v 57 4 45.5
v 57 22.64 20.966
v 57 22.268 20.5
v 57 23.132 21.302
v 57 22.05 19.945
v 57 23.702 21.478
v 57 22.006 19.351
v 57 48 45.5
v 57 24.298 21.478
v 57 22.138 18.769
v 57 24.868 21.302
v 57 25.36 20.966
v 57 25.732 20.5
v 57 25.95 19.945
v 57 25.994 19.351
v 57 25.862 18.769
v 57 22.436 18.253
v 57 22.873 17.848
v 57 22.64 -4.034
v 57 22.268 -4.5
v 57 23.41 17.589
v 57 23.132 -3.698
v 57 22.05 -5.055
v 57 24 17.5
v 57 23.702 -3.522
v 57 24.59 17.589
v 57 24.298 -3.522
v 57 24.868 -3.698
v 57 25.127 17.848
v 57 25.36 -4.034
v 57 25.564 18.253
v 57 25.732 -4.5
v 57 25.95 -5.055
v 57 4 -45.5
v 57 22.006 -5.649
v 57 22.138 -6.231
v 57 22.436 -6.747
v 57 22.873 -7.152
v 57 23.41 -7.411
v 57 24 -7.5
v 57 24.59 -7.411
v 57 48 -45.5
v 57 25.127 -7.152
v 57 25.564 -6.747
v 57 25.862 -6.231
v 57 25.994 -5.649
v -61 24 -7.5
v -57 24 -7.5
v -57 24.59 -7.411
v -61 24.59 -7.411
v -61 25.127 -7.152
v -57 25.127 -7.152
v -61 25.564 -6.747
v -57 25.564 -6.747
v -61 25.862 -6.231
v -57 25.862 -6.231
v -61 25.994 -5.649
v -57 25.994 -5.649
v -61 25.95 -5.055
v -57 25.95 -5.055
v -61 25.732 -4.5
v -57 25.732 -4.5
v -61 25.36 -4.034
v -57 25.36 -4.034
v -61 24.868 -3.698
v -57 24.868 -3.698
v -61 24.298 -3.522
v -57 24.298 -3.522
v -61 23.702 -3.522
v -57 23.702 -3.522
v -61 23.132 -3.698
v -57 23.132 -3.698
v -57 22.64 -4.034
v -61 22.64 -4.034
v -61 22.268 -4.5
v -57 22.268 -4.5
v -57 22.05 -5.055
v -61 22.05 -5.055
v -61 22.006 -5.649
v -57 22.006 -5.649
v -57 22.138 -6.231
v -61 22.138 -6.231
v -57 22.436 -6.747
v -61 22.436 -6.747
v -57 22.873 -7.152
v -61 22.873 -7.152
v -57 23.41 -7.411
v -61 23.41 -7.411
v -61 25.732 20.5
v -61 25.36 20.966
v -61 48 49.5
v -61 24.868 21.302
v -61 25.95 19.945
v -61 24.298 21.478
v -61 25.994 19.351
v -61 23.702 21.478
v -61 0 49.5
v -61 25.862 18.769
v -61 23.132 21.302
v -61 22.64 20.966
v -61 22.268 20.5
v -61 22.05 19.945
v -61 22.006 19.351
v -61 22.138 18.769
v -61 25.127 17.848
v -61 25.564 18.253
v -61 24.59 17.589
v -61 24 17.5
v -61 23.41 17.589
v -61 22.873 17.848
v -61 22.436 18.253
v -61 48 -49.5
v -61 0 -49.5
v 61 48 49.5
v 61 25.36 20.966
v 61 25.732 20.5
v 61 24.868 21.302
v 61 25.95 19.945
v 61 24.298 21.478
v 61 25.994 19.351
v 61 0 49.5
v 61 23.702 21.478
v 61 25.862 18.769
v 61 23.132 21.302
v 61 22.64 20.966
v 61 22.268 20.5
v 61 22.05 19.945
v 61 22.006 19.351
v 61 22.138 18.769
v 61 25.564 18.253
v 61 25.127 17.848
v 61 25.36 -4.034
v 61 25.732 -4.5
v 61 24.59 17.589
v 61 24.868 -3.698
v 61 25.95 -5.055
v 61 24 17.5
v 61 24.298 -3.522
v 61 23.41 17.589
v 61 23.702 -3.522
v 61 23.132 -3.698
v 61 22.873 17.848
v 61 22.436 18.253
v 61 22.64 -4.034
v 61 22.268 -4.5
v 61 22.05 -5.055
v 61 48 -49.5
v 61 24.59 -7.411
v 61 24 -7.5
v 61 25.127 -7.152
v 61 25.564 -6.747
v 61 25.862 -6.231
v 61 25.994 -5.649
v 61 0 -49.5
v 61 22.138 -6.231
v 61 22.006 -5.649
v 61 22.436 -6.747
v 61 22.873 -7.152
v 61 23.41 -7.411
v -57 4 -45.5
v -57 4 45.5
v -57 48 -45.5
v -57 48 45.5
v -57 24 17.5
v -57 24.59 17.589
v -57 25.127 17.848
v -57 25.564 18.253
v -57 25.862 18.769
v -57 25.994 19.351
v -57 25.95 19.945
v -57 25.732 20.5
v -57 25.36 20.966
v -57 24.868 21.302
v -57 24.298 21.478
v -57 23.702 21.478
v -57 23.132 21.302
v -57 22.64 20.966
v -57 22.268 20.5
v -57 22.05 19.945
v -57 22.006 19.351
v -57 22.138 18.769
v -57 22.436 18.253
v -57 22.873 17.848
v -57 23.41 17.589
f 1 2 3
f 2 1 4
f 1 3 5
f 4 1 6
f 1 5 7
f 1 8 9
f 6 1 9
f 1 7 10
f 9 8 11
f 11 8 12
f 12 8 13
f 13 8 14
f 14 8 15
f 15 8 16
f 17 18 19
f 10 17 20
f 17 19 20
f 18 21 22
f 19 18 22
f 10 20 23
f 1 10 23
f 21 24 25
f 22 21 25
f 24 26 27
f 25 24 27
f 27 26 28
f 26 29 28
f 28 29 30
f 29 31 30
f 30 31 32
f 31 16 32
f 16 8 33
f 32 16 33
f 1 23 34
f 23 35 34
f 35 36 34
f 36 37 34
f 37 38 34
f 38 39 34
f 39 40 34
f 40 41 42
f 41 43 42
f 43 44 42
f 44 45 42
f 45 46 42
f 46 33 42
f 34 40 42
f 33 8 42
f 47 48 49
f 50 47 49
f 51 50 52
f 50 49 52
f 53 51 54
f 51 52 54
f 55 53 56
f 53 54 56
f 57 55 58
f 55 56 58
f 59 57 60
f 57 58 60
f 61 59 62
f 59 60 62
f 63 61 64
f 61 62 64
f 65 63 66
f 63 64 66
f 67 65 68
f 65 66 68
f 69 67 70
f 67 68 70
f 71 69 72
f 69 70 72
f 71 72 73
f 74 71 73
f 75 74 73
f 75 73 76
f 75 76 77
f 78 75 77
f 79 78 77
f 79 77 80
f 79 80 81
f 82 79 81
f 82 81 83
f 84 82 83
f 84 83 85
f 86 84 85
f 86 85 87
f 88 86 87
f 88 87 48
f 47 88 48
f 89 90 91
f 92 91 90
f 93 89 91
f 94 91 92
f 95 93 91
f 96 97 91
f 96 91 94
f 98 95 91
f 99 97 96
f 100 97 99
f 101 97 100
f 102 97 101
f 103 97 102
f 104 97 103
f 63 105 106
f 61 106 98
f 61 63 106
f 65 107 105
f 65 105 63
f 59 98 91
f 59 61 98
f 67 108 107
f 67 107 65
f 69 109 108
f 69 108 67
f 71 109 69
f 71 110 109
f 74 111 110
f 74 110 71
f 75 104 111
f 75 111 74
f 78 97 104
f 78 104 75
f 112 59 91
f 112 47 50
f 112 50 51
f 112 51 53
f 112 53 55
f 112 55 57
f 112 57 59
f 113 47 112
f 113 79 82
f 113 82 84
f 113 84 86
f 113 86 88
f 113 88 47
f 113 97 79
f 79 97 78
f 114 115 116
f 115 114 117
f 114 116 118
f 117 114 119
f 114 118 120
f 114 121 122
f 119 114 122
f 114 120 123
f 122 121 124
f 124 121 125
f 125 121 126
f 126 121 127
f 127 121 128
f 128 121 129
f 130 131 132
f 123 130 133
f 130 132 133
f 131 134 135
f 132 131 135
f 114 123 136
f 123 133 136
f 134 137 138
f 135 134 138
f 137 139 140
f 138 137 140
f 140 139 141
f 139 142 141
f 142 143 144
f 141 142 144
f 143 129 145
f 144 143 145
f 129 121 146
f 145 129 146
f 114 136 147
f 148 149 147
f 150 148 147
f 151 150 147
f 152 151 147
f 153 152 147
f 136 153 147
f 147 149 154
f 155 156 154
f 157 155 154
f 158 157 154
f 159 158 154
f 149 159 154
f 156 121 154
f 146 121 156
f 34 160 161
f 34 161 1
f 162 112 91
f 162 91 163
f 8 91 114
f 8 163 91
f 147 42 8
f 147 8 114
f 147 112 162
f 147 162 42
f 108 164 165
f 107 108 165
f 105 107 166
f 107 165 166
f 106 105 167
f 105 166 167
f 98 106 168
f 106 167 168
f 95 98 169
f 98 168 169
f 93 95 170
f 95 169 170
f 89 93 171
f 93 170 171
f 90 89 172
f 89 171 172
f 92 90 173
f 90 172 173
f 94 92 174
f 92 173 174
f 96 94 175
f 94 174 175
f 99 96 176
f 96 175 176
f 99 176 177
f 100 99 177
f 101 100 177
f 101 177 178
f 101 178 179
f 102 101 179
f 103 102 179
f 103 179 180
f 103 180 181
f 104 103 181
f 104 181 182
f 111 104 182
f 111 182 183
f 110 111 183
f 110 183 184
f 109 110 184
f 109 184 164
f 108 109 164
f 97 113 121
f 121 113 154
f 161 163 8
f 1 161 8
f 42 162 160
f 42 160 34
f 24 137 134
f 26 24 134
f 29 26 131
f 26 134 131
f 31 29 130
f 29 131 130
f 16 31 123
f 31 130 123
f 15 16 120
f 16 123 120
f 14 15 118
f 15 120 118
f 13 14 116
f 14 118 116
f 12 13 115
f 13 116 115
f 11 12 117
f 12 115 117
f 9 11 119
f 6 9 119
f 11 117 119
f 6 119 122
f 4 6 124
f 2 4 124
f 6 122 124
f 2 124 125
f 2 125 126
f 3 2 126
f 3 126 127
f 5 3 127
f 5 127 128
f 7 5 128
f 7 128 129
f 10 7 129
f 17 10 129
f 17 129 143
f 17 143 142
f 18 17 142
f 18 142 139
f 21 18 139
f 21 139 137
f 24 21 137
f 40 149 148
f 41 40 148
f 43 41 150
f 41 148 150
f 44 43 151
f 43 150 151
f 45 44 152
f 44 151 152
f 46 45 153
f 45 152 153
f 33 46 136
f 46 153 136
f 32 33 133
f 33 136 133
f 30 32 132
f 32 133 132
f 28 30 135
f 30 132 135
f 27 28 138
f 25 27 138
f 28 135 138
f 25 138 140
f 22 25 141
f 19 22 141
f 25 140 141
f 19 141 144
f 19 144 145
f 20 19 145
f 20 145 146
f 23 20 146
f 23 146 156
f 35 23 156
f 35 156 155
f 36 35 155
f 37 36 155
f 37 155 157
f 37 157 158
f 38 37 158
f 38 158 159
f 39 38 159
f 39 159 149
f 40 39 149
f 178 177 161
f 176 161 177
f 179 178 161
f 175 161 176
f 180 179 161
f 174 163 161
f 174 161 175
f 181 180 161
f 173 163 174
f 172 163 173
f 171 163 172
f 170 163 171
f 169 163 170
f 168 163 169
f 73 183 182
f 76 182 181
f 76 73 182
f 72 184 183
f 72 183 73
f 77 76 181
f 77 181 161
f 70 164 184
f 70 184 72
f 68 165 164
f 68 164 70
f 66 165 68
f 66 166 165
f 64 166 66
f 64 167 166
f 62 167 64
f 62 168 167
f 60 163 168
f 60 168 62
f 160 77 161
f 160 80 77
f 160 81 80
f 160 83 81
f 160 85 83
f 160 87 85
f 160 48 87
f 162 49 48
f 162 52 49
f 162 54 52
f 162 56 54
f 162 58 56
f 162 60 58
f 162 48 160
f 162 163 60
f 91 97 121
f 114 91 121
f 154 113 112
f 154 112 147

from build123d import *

# Parameters (mm, degrees)
SKETCH1_W           = 122
SKETCH1_H           = 99
BOSS_EXTRUDE1_DEPTH = 48
SKETCH2_W           = 114
SKETCH2_H           = 91
CUT_EXTRUDE1_DEPTH  = 44
SKETCH3_R           = 2
CUT_EXTRUDE2_DEPTH  = 141.13654056


with BuildPart() as part:
    # Sketch1 → Boss-Extrude1 (new body)
    with BuildSketch(Plane(origin=(0, 0, 0), x_dir=(1, 0, 0), z_dir=(0, 1, 0))):
        Rectangle(SKETCH1_W, SKETCH1_H)
    extrude(amount=BOSS_EXTRUDE1_DEPTH)

    # Sketch2 → Cut-Extrude1 (cut)
    with BuildSketch(Plane(origin=(0, 48, 0), x_dir=(1, 0, 0), z_dir=(0, 1, 0))):
        Rectangle(SKETCH2_W, SKETCH2_H)
    extrude(amount=-CUT_EXTRUDE1_DEPTH, mode=Mode.SUBTRACT)

    # Sketch3 → Cut-Extrude2 (cut, through all)
    with BuildSketch(Plane(origin=(61, 0, 0), x_dir=(0, 0, -1), z_dir=(1, 0, 0))):
        with Locations((-19.5, 24)):
            Circle(SKETCH3_R)
        with Locations((5.5, 24)):
            Circle(SKETCH3_R)
    extrude(amount=-CUT_EXTRUDE2_DEPTH, mode=Mode.SUBTRACT)


solid = part.part
